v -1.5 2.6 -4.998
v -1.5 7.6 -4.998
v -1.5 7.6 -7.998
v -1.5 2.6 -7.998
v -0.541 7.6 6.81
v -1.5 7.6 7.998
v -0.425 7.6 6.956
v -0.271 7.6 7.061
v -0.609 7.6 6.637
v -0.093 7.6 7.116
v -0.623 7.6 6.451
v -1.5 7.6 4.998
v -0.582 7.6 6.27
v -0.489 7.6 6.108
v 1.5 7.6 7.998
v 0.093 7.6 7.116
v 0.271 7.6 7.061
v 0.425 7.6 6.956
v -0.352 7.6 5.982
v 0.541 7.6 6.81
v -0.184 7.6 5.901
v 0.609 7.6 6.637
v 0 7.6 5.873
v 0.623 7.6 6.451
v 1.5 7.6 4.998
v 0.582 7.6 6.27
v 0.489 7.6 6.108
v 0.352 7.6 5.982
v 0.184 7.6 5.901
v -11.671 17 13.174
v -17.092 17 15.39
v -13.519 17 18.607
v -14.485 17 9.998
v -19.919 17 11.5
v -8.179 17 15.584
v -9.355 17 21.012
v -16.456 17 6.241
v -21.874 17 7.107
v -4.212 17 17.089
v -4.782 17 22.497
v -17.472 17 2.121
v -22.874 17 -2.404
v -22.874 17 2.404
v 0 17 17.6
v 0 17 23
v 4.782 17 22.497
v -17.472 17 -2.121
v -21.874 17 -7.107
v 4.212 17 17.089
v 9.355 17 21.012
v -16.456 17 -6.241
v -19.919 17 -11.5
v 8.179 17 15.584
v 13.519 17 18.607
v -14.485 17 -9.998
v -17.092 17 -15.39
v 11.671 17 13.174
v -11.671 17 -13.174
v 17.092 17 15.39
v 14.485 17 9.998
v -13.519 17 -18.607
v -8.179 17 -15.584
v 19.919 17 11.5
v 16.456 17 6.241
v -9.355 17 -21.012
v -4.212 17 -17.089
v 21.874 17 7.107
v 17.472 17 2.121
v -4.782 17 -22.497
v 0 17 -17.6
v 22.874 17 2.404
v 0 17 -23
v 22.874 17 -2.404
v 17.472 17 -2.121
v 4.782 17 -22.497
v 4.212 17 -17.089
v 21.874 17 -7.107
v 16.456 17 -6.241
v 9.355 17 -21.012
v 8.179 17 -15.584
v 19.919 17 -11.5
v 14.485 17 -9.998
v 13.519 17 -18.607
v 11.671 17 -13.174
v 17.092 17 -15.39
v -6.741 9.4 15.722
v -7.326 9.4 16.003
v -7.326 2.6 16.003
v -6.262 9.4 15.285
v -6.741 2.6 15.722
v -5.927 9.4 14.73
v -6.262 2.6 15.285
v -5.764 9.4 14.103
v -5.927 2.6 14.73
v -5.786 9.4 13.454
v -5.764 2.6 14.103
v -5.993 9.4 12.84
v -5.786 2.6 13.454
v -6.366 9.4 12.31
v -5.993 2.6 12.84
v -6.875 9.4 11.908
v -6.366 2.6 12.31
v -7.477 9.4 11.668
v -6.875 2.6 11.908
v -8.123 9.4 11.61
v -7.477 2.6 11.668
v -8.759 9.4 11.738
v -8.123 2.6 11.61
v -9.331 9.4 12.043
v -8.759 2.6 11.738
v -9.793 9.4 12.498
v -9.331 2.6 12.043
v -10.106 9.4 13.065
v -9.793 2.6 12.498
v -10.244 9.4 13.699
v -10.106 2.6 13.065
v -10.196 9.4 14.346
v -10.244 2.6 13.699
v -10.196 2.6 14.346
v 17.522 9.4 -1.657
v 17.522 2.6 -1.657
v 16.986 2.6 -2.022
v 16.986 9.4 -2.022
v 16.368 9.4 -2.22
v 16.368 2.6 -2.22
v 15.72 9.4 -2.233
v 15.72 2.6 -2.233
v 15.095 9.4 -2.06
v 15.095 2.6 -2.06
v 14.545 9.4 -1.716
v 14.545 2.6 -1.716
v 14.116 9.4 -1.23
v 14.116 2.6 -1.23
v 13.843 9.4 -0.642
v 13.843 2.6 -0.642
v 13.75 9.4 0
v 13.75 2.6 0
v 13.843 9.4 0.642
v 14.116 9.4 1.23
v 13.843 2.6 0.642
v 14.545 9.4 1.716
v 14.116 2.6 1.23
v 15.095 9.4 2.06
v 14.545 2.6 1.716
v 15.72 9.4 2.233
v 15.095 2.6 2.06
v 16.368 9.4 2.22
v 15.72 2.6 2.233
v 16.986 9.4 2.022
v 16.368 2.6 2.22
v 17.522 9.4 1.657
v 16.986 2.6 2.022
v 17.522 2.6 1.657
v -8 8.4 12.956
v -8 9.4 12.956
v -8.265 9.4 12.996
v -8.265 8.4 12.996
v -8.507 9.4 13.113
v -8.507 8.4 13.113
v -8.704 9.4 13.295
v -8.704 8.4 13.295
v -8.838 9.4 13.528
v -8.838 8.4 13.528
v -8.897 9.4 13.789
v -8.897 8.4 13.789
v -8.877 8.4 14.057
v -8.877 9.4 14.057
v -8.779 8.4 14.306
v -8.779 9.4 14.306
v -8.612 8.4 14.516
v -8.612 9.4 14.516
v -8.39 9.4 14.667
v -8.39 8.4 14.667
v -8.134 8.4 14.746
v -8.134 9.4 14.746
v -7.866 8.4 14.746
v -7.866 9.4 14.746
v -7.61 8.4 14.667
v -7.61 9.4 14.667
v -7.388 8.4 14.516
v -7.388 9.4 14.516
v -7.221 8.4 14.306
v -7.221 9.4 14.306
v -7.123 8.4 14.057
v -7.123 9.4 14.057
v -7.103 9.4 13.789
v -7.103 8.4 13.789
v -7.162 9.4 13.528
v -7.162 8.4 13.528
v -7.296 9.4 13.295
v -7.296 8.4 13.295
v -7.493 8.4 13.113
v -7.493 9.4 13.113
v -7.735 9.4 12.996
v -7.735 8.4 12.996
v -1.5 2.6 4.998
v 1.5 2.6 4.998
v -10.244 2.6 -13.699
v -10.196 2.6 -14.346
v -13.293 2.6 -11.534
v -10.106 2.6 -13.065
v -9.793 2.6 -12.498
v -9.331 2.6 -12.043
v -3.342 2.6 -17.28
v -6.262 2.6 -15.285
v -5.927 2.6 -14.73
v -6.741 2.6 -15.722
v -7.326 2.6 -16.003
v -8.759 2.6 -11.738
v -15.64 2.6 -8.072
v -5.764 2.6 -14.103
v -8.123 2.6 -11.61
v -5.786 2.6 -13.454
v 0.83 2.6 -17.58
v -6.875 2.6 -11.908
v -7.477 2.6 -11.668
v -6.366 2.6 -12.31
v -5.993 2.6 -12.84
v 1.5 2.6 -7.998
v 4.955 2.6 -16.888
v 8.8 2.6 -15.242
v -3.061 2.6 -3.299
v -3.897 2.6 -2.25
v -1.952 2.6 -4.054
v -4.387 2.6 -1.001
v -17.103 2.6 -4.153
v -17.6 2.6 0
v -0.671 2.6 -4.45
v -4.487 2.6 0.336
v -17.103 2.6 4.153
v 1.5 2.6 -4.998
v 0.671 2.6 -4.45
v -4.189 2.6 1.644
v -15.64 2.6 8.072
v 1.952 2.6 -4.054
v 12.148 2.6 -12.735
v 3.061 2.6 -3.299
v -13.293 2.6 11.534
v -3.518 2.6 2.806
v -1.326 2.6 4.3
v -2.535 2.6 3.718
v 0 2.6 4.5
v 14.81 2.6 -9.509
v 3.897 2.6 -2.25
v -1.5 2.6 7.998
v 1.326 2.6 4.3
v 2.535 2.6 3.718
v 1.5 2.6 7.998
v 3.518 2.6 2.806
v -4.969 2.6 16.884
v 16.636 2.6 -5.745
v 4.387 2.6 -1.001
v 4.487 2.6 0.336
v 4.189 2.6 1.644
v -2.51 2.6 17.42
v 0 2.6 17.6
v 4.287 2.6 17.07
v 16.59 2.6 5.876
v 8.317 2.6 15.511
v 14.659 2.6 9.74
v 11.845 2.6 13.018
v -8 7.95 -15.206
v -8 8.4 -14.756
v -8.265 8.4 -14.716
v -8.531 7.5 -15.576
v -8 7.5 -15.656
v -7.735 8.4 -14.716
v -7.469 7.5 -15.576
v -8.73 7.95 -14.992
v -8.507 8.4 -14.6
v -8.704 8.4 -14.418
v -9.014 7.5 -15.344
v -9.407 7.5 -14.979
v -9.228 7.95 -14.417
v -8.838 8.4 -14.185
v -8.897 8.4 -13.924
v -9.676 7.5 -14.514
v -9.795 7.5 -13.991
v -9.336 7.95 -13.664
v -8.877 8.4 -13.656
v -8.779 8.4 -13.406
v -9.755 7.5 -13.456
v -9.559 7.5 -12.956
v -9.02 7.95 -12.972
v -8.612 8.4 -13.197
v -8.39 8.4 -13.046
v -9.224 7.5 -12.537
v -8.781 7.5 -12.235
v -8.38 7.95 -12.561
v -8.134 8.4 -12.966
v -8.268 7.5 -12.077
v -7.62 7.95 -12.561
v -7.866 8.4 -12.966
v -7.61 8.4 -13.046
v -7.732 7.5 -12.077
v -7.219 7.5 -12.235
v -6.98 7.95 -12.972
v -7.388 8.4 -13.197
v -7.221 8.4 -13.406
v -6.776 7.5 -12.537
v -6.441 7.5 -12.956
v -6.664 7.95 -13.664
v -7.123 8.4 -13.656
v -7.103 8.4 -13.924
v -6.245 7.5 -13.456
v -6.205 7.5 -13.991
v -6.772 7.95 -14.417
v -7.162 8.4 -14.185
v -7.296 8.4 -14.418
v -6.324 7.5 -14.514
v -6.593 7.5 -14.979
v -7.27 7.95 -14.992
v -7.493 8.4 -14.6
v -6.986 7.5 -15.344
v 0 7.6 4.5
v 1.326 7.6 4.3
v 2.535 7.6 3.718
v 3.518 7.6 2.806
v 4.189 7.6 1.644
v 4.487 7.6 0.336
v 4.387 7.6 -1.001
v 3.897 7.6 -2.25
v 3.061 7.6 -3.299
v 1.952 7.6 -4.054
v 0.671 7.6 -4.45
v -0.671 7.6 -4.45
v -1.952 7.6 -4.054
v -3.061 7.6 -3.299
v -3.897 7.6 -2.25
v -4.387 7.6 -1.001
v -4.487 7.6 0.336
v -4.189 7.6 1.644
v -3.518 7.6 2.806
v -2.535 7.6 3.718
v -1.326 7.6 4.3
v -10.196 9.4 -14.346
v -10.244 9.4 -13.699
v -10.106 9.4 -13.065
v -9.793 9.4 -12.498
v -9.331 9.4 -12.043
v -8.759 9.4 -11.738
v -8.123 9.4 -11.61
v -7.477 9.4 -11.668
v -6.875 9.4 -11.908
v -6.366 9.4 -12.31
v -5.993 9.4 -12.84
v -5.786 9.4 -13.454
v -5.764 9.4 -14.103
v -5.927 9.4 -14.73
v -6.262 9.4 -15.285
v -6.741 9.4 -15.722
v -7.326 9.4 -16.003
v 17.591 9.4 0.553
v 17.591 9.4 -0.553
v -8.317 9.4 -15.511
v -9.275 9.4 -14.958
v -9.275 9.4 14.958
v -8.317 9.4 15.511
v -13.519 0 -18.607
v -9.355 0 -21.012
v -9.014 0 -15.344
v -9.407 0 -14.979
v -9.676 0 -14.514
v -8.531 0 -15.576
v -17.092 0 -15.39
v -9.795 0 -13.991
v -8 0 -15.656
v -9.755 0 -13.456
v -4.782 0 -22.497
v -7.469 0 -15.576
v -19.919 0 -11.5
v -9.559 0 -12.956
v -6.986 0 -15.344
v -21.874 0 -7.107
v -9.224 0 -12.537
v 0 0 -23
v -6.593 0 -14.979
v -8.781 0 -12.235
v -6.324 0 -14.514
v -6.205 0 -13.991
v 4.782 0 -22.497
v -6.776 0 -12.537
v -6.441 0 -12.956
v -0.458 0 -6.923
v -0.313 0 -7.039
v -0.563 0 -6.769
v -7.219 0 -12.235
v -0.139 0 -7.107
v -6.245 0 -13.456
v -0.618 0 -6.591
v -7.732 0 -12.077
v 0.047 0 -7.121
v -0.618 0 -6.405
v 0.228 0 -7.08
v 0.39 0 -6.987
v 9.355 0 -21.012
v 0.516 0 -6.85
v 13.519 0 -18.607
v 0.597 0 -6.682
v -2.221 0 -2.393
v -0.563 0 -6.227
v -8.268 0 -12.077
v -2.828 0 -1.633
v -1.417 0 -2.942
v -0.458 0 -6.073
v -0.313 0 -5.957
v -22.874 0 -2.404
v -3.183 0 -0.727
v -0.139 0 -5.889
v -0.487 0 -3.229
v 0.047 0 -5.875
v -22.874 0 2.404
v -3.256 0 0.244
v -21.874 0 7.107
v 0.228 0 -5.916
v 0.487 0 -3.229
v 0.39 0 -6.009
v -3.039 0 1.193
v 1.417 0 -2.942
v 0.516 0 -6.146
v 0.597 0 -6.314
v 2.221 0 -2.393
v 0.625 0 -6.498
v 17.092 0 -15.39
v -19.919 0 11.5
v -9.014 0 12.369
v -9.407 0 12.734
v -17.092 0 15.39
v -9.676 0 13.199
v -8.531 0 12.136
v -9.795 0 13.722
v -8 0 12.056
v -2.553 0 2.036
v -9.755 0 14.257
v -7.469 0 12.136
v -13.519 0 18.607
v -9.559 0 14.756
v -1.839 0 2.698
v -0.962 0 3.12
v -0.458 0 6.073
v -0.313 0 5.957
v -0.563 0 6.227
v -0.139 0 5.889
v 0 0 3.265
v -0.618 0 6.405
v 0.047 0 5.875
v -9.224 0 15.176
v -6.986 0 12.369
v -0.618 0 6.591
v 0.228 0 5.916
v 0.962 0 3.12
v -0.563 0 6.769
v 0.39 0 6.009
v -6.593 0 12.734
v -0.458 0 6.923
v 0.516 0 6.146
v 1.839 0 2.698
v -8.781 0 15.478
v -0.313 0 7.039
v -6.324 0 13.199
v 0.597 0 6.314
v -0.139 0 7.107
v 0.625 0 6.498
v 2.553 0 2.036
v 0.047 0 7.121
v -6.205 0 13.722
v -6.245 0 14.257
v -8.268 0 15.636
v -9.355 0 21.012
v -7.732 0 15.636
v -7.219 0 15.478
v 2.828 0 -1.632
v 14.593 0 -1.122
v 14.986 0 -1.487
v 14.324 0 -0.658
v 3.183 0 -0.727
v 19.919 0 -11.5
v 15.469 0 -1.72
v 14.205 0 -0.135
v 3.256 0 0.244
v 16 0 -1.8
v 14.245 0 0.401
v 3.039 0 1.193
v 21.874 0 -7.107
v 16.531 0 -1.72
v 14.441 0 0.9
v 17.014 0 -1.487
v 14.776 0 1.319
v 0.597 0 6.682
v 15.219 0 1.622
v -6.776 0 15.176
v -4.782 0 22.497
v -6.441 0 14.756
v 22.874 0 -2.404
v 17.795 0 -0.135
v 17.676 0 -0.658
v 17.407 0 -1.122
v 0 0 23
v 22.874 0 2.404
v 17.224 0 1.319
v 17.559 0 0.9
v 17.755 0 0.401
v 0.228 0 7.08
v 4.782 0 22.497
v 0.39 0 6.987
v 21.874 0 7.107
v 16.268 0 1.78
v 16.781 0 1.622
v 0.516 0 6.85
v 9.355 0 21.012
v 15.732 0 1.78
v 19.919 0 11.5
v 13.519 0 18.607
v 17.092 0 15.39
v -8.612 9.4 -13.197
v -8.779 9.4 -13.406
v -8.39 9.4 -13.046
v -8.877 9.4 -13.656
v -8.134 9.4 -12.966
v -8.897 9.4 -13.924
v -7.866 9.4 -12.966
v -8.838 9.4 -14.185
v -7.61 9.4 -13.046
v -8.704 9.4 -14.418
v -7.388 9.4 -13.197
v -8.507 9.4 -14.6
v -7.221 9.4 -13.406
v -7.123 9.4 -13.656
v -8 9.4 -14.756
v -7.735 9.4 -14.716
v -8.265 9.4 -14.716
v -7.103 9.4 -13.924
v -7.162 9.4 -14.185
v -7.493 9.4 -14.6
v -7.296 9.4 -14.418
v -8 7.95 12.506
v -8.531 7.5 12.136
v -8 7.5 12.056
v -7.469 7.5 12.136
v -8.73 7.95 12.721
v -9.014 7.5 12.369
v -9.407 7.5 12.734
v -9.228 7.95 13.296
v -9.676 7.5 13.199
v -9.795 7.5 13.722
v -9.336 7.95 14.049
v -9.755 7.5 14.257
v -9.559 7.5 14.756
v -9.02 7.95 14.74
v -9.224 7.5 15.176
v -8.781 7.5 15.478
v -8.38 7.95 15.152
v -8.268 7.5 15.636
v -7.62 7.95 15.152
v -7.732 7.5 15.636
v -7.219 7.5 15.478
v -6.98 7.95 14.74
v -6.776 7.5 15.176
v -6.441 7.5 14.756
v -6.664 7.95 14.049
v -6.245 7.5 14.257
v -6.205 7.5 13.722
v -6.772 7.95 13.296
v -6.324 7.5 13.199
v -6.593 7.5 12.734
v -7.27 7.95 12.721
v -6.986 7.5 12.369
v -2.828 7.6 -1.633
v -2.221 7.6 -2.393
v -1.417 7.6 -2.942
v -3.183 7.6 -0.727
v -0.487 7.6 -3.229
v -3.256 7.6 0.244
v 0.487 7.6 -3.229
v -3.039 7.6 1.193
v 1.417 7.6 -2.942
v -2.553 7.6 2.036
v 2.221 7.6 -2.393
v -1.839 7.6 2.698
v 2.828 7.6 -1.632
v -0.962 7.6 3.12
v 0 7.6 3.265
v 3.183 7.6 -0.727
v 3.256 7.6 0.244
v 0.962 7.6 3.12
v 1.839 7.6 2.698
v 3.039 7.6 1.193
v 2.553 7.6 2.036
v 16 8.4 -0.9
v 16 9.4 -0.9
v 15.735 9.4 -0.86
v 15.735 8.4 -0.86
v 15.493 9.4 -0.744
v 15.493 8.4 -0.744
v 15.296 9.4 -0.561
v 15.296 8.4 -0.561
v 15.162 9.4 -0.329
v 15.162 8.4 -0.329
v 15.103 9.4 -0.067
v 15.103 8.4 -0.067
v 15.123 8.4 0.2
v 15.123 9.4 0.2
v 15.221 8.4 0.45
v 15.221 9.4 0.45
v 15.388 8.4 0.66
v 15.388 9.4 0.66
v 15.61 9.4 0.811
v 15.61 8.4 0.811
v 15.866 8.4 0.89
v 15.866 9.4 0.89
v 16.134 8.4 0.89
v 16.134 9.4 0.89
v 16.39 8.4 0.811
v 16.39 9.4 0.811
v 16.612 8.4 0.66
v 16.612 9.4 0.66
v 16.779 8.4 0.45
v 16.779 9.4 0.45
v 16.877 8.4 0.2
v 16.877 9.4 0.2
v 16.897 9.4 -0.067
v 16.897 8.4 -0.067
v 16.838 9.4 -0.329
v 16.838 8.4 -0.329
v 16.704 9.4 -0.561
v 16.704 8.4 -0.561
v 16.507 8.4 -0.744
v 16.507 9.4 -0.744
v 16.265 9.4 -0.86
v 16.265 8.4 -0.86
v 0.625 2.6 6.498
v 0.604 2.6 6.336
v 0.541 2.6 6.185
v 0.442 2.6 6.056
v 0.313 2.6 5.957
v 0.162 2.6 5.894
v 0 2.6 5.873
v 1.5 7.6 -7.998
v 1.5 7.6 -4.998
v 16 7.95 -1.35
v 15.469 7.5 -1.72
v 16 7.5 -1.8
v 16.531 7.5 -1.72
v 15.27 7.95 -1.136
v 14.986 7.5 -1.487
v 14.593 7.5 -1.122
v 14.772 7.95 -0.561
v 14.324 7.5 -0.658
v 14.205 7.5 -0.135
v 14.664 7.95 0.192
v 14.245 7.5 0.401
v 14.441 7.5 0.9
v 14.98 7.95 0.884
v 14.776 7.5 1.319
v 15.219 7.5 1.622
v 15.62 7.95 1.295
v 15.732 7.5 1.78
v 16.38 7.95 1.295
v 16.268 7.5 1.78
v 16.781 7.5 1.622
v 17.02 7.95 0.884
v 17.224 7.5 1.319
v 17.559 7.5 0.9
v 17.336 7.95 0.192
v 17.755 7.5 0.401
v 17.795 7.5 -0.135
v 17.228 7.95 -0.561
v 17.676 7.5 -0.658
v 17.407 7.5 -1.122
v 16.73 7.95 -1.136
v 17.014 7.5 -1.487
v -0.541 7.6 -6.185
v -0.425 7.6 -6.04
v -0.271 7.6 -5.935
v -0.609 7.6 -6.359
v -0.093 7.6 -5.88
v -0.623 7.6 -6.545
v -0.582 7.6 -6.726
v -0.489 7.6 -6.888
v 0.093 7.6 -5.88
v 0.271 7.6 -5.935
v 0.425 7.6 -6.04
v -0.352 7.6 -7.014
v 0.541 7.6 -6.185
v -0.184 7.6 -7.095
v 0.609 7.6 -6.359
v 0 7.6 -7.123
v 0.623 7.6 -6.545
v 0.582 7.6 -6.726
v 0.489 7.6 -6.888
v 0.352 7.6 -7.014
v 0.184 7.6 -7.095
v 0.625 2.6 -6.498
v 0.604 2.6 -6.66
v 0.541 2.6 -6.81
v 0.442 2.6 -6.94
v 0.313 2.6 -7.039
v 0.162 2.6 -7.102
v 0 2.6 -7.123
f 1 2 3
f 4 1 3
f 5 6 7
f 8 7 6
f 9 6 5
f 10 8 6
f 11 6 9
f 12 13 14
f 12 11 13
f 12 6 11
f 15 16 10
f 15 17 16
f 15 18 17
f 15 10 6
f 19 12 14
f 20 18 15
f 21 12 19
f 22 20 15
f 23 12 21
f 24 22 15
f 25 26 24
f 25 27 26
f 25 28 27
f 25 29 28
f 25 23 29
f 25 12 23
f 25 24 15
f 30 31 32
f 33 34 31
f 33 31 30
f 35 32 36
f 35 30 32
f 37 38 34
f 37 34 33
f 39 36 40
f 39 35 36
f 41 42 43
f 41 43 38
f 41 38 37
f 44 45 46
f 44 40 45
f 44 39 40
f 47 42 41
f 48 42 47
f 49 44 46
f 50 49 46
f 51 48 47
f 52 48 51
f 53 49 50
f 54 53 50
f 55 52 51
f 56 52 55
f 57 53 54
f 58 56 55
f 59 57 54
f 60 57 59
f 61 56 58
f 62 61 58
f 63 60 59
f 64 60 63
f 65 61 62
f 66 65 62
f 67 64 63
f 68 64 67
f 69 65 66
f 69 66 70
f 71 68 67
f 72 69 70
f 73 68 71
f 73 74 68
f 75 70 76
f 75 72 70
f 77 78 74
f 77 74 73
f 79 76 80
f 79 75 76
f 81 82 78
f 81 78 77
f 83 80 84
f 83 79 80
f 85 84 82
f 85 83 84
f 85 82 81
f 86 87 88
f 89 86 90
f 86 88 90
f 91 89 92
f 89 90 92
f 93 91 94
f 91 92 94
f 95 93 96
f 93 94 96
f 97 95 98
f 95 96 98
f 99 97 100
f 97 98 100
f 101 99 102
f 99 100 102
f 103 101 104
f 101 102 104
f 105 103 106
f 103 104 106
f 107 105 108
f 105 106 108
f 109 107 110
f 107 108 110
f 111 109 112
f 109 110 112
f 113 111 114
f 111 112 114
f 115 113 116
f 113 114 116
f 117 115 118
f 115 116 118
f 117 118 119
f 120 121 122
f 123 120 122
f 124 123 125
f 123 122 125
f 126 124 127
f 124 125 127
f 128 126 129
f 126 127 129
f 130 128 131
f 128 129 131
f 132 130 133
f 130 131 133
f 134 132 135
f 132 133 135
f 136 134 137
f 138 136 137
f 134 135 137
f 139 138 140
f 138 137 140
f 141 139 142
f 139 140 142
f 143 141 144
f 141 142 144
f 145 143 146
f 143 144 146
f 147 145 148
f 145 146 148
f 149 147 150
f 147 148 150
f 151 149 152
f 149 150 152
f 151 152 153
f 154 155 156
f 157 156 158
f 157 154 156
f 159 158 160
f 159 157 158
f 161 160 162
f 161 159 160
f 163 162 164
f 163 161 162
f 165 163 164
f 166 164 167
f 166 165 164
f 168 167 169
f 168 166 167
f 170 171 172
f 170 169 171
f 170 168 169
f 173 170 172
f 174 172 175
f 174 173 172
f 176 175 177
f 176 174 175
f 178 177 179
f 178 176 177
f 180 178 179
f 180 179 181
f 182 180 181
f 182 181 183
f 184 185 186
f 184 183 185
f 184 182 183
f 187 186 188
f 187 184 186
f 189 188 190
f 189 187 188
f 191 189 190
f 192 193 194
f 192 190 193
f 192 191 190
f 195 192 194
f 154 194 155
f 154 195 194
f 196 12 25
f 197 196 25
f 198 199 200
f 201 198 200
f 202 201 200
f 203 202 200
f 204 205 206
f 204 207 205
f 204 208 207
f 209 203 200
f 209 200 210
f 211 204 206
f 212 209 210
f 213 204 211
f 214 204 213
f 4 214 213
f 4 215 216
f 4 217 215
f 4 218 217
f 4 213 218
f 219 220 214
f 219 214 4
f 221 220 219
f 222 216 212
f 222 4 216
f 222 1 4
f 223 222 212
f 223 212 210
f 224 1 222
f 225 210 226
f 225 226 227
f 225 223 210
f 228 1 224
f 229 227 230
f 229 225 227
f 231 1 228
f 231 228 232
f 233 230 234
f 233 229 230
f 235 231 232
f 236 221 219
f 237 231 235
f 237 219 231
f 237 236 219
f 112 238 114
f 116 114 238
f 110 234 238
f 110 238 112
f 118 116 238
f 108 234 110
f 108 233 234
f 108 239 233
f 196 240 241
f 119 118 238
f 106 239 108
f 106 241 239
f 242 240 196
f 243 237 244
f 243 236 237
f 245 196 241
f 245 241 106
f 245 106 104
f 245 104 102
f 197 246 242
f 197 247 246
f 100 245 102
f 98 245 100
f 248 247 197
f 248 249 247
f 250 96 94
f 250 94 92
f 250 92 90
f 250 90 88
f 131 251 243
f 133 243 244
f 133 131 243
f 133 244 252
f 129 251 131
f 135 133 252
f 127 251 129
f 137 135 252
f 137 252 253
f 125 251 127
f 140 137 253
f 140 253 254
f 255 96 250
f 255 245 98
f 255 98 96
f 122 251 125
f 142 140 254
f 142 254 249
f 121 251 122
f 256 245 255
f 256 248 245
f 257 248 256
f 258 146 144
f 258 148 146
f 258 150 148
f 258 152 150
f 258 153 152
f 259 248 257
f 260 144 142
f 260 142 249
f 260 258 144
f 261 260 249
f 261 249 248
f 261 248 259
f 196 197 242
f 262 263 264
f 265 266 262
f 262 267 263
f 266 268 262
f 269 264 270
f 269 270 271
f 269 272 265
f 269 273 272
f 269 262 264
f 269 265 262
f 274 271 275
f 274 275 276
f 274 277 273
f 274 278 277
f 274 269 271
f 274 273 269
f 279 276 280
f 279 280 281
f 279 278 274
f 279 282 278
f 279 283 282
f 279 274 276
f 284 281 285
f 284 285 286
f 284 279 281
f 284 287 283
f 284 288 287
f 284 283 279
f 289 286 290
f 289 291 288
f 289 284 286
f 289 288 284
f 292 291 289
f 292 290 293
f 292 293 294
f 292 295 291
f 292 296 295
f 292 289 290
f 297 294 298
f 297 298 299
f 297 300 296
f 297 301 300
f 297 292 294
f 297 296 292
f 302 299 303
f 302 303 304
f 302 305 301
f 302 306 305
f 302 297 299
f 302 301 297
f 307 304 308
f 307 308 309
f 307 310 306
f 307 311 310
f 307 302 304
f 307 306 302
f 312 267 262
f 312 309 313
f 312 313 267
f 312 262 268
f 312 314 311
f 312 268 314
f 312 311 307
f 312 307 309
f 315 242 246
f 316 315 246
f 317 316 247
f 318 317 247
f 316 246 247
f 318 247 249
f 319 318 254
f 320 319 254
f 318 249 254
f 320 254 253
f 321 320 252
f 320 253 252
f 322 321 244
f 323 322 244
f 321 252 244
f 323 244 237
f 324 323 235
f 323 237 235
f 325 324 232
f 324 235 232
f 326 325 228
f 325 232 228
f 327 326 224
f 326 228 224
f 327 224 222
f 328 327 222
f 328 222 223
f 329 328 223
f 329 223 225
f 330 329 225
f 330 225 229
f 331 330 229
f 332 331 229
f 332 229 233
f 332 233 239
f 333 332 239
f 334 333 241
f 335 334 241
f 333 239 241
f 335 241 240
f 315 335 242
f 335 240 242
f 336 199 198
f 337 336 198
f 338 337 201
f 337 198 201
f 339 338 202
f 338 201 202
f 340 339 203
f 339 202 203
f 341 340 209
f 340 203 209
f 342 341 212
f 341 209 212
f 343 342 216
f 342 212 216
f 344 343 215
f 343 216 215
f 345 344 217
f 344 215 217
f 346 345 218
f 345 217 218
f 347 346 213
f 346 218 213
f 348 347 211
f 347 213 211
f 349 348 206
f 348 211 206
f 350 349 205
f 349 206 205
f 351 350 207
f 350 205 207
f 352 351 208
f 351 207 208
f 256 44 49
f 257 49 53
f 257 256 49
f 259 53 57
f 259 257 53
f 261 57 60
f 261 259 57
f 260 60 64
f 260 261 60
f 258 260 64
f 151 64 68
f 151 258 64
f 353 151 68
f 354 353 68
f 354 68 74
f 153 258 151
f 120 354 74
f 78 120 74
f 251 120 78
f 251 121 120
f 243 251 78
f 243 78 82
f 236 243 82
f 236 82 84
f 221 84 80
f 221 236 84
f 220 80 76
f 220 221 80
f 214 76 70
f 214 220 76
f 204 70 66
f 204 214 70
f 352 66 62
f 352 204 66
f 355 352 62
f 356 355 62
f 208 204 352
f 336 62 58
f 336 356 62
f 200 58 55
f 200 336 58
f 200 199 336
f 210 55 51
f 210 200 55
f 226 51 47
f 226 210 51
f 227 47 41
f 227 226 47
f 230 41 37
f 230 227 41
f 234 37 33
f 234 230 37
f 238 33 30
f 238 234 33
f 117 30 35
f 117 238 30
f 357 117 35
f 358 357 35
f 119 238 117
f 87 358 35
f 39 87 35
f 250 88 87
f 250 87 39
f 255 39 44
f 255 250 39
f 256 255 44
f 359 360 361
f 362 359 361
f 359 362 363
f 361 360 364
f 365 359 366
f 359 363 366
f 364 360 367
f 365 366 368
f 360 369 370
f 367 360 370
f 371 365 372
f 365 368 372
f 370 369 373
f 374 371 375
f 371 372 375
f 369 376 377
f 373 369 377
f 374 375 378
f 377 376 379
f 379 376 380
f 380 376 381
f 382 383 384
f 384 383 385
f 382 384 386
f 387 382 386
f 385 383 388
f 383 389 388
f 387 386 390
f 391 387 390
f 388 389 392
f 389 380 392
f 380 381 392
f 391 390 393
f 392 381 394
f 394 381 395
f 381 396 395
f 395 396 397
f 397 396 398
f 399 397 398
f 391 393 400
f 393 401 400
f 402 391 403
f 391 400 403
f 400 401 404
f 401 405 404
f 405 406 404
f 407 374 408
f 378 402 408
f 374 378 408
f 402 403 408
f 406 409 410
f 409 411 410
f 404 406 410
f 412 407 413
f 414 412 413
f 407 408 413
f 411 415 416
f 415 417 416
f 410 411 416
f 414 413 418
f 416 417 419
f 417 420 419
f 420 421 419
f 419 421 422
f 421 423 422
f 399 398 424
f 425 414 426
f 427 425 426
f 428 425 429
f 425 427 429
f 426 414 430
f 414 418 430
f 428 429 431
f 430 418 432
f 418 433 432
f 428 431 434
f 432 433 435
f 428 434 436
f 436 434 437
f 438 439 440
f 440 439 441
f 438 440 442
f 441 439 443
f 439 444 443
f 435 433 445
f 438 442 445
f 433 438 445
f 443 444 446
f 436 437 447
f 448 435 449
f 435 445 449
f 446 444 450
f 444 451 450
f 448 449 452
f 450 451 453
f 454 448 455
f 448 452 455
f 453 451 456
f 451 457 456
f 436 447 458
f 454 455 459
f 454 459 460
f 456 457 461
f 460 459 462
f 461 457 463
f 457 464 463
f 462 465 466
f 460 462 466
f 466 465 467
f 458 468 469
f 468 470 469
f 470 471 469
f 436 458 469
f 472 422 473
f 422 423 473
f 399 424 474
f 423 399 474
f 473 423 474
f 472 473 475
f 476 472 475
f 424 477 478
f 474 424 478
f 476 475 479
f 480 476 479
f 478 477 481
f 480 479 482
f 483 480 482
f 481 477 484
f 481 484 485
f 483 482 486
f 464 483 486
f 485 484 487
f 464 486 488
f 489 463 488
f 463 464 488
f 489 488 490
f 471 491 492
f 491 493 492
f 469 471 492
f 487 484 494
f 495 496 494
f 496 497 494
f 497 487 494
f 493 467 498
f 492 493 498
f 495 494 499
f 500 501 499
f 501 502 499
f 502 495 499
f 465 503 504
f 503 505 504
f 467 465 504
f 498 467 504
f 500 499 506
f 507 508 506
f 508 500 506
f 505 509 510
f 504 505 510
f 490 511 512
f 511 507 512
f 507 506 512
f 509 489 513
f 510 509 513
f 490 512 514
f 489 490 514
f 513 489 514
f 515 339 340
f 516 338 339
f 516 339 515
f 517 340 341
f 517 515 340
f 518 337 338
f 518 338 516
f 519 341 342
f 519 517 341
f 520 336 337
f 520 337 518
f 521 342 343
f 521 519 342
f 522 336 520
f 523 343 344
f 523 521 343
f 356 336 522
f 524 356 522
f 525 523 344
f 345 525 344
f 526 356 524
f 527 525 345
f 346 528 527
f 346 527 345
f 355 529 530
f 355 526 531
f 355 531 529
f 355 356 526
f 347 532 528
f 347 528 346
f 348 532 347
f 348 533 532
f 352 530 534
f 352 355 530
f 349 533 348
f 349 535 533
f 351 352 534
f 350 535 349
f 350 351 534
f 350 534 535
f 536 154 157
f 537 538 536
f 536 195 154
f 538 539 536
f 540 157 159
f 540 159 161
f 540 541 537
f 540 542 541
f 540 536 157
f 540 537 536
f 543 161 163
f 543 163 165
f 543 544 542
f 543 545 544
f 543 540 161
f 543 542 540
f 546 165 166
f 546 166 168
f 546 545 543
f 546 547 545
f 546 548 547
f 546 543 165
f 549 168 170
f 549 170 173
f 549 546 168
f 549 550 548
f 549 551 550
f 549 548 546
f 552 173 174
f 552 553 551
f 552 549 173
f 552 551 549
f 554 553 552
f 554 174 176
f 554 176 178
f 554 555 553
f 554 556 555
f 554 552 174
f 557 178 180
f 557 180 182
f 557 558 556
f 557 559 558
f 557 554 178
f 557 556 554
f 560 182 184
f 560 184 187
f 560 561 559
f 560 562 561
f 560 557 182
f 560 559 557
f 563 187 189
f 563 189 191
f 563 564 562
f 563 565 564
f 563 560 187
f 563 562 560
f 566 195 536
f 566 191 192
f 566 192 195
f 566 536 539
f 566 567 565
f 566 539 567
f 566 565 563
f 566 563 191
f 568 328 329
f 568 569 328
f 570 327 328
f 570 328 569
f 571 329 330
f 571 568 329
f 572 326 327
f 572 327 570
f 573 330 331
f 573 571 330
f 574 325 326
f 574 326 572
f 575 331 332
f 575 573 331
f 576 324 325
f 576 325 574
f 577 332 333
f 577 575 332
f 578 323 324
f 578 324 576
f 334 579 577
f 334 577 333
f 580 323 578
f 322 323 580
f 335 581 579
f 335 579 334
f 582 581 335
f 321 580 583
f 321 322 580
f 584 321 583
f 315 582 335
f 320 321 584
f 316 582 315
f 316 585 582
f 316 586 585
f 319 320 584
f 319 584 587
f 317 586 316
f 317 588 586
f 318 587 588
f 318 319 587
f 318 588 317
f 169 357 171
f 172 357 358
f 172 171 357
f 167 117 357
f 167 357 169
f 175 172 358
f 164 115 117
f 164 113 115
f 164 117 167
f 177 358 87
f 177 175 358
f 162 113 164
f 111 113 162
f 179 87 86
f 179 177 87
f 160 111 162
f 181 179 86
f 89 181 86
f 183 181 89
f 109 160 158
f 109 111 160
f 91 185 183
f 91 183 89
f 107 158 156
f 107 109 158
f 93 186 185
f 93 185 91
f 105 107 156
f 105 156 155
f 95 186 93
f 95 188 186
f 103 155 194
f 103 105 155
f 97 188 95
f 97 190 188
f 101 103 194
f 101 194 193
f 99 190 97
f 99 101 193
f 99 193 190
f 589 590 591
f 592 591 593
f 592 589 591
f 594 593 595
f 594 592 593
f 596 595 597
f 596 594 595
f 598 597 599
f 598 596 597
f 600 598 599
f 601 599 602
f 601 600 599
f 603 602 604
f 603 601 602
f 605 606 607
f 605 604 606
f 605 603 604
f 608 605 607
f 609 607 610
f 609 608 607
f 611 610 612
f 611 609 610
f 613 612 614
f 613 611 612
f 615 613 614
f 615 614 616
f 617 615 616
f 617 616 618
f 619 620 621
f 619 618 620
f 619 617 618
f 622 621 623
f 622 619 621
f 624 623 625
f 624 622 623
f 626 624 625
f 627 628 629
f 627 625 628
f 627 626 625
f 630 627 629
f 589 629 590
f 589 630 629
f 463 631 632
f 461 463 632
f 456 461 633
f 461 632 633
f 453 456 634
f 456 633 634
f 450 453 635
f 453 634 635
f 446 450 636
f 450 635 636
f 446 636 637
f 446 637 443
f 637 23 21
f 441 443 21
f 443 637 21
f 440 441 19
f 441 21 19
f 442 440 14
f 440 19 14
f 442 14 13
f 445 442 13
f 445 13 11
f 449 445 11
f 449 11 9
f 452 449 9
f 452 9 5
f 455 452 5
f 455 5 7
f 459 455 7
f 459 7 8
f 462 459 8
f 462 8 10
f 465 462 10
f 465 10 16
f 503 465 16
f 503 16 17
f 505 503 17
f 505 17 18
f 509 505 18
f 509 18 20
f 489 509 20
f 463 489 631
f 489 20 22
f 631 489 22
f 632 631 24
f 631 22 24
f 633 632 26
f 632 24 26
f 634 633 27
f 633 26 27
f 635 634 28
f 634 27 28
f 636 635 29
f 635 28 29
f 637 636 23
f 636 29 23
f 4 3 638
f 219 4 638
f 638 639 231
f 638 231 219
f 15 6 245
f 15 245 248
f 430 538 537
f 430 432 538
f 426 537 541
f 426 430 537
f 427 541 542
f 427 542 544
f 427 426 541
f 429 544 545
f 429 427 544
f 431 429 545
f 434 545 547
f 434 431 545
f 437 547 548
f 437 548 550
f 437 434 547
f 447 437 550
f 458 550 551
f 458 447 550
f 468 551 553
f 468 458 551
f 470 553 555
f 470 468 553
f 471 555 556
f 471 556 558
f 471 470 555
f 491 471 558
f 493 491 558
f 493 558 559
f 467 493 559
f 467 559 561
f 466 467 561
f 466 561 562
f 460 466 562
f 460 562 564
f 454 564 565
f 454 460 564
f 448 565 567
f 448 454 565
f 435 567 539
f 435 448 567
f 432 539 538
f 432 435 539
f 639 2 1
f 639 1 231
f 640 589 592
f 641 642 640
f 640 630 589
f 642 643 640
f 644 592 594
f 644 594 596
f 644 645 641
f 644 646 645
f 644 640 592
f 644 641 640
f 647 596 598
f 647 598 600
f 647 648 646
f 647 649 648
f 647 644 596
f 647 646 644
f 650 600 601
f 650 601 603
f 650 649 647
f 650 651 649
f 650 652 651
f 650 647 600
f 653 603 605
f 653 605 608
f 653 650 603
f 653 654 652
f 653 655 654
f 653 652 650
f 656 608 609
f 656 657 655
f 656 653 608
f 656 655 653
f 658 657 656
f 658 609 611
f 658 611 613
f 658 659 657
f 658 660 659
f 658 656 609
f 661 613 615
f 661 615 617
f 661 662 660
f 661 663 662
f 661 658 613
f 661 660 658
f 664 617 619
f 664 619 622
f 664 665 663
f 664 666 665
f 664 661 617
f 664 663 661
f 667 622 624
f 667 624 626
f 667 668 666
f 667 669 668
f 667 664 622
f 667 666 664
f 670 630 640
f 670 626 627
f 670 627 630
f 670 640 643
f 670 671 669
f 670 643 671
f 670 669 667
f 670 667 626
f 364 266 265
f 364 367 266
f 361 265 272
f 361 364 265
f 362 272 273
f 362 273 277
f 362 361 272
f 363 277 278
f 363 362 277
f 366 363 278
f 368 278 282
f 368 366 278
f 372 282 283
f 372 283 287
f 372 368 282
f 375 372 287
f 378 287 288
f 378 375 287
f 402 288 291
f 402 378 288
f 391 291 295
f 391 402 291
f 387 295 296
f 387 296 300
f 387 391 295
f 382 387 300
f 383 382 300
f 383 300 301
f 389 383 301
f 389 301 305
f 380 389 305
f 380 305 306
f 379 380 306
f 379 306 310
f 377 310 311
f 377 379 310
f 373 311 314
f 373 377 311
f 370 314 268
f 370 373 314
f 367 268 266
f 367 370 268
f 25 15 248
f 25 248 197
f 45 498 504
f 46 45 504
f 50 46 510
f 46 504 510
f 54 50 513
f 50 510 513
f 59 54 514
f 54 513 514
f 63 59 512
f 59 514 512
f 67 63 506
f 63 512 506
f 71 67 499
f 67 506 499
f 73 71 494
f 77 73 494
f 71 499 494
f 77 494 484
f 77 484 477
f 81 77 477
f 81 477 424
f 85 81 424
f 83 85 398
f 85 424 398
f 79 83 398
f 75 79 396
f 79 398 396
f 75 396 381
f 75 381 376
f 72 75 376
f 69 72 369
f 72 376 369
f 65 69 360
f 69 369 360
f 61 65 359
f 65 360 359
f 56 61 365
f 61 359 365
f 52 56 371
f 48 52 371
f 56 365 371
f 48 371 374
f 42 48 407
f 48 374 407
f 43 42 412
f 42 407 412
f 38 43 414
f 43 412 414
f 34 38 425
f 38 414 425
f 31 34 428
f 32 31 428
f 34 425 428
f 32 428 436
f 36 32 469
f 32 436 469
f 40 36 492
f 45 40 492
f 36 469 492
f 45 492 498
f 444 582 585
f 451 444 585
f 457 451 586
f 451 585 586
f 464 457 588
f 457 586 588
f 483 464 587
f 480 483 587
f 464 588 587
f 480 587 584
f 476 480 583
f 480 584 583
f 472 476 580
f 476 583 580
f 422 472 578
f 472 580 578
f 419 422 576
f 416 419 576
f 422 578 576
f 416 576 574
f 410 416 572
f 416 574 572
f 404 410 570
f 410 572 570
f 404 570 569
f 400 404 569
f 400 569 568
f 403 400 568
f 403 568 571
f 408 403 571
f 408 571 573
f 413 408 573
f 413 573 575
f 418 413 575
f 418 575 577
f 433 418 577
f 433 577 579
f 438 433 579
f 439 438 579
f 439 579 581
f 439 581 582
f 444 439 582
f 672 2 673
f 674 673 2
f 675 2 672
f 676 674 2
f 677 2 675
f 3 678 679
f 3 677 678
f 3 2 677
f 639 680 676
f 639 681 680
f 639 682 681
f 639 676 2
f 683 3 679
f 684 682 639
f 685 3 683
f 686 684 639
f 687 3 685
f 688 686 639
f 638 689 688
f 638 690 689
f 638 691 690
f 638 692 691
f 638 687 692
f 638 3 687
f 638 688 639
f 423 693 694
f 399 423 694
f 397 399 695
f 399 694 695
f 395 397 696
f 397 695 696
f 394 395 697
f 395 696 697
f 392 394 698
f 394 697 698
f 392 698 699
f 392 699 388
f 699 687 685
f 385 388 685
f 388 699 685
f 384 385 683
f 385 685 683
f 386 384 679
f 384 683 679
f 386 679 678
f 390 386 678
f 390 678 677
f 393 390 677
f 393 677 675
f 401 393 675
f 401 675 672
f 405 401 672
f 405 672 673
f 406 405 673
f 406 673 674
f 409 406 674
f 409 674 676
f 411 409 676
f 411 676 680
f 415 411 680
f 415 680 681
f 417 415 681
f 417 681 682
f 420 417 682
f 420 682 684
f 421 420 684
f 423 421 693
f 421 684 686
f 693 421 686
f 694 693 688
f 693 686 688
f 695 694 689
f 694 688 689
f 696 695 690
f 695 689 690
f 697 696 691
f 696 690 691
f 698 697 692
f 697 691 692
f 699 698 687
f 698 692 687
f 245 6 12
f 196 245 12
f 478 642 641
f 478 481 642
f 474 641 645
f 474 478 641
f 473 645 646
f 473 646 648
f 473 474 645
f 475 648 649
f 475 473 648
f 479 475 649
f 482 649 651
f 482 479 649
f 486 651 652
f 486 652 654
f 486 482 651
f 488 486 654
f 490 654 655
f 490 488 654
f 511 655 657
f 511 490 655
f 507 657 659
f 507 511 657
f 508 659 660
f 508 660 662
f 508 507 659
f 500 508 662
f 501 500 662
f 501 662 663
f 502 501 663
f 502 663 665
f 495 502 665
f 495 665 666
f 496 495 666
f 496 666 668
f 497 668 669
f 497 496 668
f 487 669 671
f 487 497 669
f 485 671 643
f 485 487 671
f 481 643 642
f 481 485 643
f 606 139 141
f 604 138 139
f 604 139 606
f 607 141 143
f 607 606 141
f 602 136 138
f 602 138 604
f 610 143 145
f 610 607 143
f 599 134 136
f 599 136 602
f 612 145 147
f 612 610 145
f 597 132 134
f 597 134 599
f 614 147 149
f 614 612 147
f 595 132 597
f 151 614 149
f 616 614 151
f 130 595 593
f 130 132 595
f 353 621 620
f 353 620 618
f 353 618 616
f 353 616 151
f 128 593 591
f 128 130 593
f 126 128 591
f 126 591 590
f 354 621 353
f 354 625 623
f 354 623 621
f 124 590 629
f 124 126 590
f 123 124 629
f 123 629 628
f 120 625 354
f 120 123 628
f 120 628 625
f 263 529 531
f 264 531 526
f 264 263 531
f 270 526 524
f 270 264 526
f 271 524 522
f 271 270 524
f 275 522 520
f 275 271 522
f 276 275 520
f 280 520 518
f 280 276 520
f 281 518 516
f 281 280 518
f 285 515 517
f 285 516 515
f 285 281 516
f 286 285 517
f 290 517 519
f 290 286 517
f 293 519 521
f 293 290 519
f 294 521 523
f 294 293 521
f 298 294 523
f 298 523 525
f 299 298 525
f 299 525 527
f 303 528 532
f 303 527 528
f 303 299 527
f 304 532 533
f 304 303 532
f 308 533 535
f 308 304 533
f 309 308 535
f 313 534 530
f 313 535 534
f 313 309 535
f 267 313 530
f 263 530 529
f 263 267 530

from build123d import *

# Parameters (mm, degrees)
SKETCH1_R                                    = 23
BOSS_EXTRUDE1_DEPTH                          = 17
SHELL1_T                                     = -2.6
SKETCH4_R                                    = 4.5
BOSS_EXTRUDE3_DEPTH                          = 5
SKETCH5_R                                    = 3.265
CUT_EXTRUDE2_DEPTH                           = 34.857938508
M1_6_TAPPED_HOLE1_D                          = 1.25
BOSS_EXTRUDE8_START                          = 5
SKETCH20_W                                   = 3
SKETCH20_H                                   = 3
SKETCH20_R                                   = 0.625
BOSS_EXTRUDE8_DEPTH                          = 5
SKETCH22_R                                   = 20.4
SKETCH22_R_2                                 = 17.6
BOSS_EXTRUDE10_DEPTH                         = 14.4
SKETCH24_R                                   = 2.25
BOSS_EXTRUDE11_DEPTH                         = 6.8
CSK_SLOT_FOR_M1_6_COUNTERSUNK_FLAT_H_2_COUNT = 2
CSK_SLOT_FOR_M1_6_COUNTERSUNK_FLAT_H_2_PITCH = 27.712812921
CSK_SLOT_FOR_M1_6_COUNTERSUNK_FLAT_H_3_COUNT = 2
CSK_SLOT_FOR_M1_6_COUNTERSUNK_FLAT_H_3_PITCH = 27.712812921


with BuildPart() as part:
    # Sketch1 → Boss-Extrude1 (new body)
    with BuildSketch(Plane(origin=(0, 0, 0), x_dir=(1, 0, 0), z_dir=(0, 1, 0))):
        with Locations(Location((0, 0, 0), (0, 0, 270))):
            Circle(SKETCH1_R)
    extrude(amount=BOSS_EXTRUDE1_DEPTH)

    # Shell1
    shell1_openings = [part.faces().sort_by_distance(p)[0] for p in [
        (0, 17, 0),
    ]]
    offset(amount=SHELL1_T, openings=shell1_openings, kind=Kind.INTERSECTION)

    # Sketch4 → Boss-Extrude3 (add)
    with BuildSketch(Plane(origin=(0, 2.6, 0), x_dir=(1, 0, 0), z_dir=(0, 1, 0))):
        with Locations(Location((0, 0, 0), (0, 0, 270))):
            Circle(SKETCH4_R)
    extrude(amount=BOSS_EXTRUDE3_DEPTH)

    # Sketch5 → Cut-Extrude2 (cut, through all)
    with BuildSketch(Plane(origin=(0, 7.6, 0), x_dir=(1, 0, 0), z_dir=(0, 1, 0))):
        with Locations(Location((0, 0, 0), (0, 0, 270))):
            Circle(SKETCH5_R)
    extrude(amount=-CUT_EXTRUDE2_DEPTH, mode=Mode.SUBTRACT)

    # M1.6 Tapped Hole1 (through all)
    with Locations(Plane(origin=(0, 0, 0), x_dir=(-1, 0, 0), z_dir=(0, -1, 0))):
        with Locations((0, 6.497951731), (0, -6.497951731)):
            Hole(M1_6_TAPPED_HOLE1_D / 2)

    # Sketch20 → Boss-Extrude8 (add)
    # profile 1 of 2: a face of its own
    with BuildSketch(Plane(origin=(0, 2.6, 0), x_dir=(1, 0, 0), z_dir=(0, 1, 0)).offset(BOSS_EXTRUDE8_START)):
        with Locations((0, -6.497951731)):
            Rectangle(SKETCH20_W, SKETCH20_H)
        with Locations(Location((0, -6.497951731, 0), (0, 0, 90))):
            Circle(SKETCH20_R, mode=Mode.SUBTRACT)
    # profile 2 of 2: a face of its own
    with BuildSketch(Plane(origin=(0, 2.6, 0), x_dir=(1, 0, 0), z_dir=(0, 1, 0)).offset(BOSS_EXTRUDE8_START)):
        with Locations((0, 6.497951731)):
            Rectangle(SKETCH20_W, SKETCH20_H)
        with Locations(Location((0, 6.497951731, 0), (0, 0, 90))):
            Circle(SKETCH20_R, mode=Mode.SUBTRACT)
    extrude(amount=-BOSS_EXTRUDE8_DEPTH)

    # Sketch22 → Boss-Extrude10 (add)
    with BuildSketch(Plane(origin=(0, 2.6, 0), x_dir=(1, 0, 0), z_dir=(0, 1, 0))):
        Circle(SKETCH22_R)
        with Locations(Location((0, 0, 0), (0, 0, 270))):
            Circle(SKETCH22_R_2, mode=Mode.SUBTRACT)
    extrude(amount=BOSS_EXTRUDE10_DEPTH)

    # Sketch24 → Boss-Extrude11 (add)
    with BuildSketch(Plane(origin=(0, 2.6, 0), x_dir=(1, 0, 0), z_dir=(0, 1, 0))):
        with Locations((-8, 13.856406461)):
            Circle(SKETCH24_R)
        with Locations((16, 0)):
            Circle(SKETCH24_R)
        with Locations((-8, -13.856406461)):
            Circle(SKETCH24_R)
    extrude(amount=BOSS_EXTRUDE11_DEPTH)

    # Sketch26 → CSK SLOT for M1.6 Countersunk Flat Head (revolve, cut)
    with BuildSketch(Plane(origin=(-8, 0, 13.856406461), x_dir=(0, 0, -1), z_dir=(1, 0, 0))):
        Polygon((0, 0), (0, 17), (0.9, 17), (0.9, 8.4), (1.8, 7.5), (1.8, 0), align=None)
    csk_slot_for_m1_6_countersunk_flat_head = revolve(axis=Axis((-8, -6.35, 13.856406461), (0, 1, 0)), mode=Mode.SUBTRACT)

    # CSK SLOT for M1.6 Countersunk Flat H 2: CSK SLOT for M1.6 Countersunk Flat Head ×2
    with Locations(*[(0, 0, -i * CSK_SLOT_FOR_M1_6_COUNTERSUNK_FLAT_H_2_PITCH) for i in range(1, CSK_SLOT_FOR_M1_6_COUNTERSUNK_FLAT_H_2_COUNT)]):
        add(csk_slot_for_m1_6_countersunk_flat_head, mode=Mode.SUBTRACT)

    # CSK SLOT for M1.6 Countersunk Flat H 3: CSK SLOT for M1.6 Countersunk Flat Head ×2
    with Locations(*[Vector(0.8660254037844364, 0, -0.5000000000000041) * (i * CSK_SLOT_FOR_M1_6_COUNTERSUNK_FLAT_H_3_PITCH) for i in range(1, CSK_SLOT_FOR_M1_6_COUNTERSUNK_FLAT_H_3_COUNT)]):
        add(csk_slot_for_m1_6_countersunk_flat_head, mode=Mode.SUBTRACT)


solid = part.part
